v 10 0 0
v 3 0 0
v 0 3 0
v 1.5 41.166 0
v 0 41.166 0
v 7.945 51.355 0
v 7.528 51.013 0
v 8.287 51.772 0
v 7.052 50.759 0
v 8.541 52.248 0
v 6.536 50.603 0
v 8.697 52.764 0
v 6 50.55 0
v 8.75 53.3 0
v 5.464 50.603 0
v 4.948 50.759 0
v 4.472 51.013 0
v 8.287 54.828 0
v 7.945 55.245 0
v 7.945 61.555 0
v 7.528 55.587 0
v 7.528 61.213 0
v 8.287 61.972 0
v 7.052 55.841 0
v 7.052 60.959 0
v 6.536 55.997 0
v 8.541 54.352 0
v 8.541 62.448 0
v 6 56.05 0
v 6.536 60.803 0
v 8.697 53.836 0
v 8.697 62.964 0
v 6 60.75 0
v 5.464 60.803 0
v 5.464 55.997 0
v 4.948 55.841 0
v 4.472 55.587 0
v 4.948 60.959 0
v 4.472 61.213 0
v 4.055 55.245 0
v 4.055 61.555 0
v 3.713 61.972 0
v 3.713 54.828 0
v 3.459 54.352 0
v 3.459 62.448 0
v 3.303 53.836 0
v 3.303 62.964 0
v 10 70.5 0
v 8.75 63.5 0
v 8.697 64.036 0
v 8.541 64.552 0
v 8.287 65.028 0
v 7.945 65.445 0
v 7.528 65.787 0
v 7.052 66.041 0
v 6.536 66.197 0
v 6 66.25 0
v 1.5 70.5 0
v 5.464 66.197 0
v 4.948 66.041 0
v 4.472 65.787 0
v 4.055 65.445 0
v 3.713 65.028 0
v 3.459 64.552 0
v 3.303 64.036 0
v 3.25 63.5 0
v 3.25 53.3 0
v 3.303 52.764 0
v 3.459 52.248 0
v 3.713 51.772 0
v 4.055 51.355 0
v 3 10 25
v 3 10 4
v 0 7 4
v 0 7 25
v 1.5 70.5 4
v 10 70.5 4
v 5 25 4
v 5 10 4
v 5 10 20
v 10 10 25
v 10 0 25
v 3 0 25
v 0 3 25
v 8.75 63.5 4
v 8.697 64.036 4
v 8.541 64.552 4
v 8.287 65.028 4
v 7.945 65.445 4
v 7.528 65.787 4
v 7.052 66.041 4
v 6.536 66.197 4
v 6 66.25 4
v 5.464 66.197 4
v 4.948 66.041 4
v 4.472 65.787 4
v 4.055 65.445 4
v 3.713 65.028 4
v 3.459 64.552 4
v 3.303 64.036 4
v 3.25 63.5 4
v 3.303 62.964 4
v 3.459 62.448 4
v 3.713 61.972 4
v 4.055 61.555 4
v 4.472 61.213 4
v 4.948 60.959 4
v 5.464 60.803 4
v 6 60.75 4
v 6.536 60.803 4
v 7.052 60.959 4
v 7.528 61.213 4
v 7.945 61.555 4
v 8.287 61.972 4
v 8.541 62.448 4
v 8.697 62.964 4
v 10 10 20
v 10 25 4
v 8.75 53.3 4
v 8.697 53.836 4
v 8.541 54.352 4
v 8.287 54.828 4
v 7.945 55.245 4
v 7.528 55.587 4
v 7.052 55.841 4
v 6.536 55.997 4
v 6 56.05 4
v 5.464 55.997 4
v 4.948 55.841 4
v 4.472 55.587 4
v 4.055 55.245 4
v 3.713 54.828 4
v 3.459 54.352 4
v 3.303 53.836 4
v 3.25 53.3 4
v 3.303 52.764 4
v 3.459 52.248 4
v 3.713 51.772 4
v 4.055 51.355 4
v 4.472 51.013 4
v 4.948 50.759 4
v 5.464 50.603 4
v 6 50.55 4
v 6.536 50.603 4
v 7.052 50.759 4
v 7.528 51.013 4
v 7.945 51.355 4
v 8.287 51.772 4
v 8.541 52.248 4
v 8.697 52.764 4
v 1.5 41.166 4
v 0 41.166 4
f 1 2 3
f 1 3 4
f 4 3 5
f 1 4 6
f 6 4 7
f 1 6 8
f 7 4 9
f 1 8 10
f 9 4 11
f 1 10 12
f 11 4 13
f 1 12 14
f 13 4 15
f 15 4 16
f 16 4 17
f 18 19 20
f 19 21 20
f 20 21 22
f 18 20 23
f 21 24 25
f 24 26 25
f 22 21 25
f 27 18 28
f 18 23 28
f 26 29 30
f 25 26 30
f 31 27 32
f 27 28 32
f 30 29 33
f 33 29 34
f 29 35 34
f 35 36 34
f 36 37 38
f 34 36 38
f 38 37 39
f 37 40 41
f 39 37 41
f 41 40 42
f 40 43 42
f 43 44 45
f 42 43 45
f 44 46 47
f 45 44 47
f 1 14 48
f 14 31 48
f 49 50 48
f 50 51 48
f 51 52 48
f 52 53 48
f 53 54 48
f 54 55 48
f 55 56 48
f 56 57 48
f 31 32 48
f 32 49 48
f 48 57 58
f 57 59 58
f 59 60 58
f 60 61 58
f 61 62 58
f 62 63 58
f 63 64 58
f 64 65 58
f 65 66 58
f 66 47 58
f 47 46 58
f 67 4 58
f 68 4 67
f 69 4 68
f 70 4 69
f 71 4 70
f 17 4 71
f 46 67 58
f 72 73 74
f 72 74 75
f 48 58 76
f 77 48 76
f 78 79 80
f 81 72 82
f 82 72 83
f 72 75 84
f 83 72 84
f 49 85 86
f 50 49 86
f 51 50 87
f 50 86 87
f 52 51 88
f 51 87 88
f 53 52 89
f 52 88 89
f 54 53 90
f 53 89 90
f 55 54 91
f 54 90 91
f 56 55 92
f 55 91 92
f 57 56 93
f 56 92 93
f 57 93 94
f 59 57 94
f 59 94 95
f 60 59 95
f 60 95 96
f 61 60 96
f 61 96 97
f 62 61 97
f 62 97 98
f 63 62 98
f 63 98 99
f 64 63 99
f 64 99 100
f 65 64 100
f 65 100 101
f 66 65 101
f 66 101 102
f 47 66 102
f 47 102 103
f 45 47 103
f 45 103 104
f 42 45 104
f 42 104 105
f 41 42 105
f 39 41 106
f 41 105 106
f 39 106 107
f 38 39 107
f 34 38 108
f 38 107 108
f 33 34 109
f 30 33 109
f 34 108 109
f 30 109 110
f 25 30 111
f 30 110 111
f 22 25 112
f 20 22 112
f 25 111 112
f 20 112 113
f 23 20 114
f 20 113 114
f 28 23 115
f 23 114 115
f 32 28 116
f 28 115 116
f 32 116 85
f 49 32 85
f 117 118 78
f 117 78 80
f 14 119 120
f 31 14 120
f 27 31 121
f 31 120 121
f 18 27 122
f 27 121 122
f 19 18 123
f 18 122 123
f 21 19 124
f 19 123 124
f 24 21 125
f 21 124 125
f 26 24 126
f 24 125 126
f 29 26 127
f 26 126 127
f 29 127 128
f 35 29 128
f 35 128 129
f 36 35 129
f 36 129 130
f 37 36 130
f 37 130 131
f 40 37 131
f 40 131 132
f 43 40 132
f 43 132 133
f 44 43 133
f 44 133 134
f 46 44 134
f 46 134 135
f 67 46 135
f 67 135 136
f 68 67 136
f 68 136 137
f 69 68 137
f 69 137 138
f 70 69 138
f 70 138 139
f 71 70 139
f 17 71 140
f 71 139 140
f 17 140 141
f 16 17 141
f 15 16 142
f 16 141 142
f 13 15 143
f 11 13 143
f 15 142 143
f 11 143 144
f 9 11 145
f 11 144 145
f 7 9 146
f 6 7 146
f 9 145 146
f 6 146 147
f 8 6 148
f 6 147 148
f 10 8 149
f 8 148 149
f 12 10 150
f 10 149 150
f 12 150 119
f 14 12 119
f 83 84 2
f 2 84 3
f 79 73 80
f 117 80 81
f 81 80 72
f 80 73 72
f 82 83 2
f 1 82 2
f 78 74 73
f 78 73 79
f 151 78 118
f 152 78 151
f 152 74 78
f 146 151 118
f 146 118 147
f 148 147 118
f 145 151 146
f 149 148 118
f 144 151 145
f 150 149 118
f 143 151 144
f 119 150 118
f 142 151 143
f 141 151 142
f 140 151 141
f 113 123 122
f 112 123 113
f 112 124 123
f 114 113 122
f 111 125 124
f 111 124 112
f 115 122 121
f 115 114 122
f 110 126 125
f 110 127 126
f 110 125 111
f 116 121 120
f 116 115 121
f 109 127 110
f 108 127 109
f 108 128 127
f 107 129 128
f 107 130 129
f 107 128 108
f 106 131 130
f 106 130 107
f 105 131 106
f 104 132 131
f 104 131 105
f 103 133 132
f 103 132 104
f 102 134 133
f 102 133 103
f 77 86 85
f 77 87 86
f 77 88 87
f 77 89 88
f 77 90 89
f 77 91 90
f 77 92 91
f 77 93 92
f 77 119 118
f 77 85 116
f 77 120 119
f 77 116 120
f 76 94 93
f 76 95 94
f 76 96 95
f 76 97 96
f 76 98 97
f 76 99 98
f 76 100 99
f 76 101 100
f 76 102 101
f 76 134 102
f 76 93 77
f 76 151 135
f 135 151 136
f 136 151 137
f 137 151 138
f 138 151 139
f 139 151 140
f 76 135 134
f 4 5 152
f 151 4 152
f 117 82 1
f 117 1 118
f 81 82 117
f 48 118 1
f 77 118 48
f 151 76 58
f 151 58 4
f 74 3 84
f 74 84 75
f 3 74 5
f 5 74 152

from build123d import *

# Parameters (mm, degrees)
F0_W     = 60.5
F0_H     = 4
F1_DEPTH = 10
F2_R     = 2.75
F3_DEPTH = 31.7
F4_SIZE  = 3
F5_W     = 29.333754
F5_H     = 4
F6_DEPTH = 1.5
F8_DEPTH = 5


with BuildPart() as f1:
    # F0 (on Right) → F1 (new body)
    with BuildSketch(Plane.YZ):
        Polygon((0, 25), (0, 0), (10, 0), (10, 4), (10, 25), align=None)
        with Locations((40.25, 2)):
            Rectangle(F0_W, F0_H)
    extrude(amount=F1_DEPTH)

    # F2 (on face) → F3 (cut)
    with BuildSketch(Plane.XY.offset(4)):
        with Locations((6, 53.3)):
            Circle(F2_R)
        with Locations((6, 63.5)):
            Circle(F2_R)
    extrude(amount=-F3_DEPTH, mode=Mode.SUBTRACT)

    # F4
    f4_edges = [f1.edges().sort_by_distance(p)[0] for p in [
        (0, 0, 12.5),
        (0, 10, 14.5),
    ]]
    chamfer(f4_edges, length=F4_SIZE)

    # F5 (on face) → F6 (cut)
    with BuildSketch(Plane(origin=(0, 0, 0), x_dir=(0, -1, 0), z_dir=(-1, 0, 0))):
        with Locations((-55.833123, 2)):
            Rectangle(F5_W, F5_H)
    extrude(amount=-F6_DEPTH, mode=Mode.SUBTRACT)

    # F7 (on face) → F8 (join)
    with BuildSketch(Plane.YZ.offset(10)):
        Polygon((25, 4), (10, 20), (10, 4), align=None)
    extrude(amount=-F8_DEPTH)


solid = f1.part
